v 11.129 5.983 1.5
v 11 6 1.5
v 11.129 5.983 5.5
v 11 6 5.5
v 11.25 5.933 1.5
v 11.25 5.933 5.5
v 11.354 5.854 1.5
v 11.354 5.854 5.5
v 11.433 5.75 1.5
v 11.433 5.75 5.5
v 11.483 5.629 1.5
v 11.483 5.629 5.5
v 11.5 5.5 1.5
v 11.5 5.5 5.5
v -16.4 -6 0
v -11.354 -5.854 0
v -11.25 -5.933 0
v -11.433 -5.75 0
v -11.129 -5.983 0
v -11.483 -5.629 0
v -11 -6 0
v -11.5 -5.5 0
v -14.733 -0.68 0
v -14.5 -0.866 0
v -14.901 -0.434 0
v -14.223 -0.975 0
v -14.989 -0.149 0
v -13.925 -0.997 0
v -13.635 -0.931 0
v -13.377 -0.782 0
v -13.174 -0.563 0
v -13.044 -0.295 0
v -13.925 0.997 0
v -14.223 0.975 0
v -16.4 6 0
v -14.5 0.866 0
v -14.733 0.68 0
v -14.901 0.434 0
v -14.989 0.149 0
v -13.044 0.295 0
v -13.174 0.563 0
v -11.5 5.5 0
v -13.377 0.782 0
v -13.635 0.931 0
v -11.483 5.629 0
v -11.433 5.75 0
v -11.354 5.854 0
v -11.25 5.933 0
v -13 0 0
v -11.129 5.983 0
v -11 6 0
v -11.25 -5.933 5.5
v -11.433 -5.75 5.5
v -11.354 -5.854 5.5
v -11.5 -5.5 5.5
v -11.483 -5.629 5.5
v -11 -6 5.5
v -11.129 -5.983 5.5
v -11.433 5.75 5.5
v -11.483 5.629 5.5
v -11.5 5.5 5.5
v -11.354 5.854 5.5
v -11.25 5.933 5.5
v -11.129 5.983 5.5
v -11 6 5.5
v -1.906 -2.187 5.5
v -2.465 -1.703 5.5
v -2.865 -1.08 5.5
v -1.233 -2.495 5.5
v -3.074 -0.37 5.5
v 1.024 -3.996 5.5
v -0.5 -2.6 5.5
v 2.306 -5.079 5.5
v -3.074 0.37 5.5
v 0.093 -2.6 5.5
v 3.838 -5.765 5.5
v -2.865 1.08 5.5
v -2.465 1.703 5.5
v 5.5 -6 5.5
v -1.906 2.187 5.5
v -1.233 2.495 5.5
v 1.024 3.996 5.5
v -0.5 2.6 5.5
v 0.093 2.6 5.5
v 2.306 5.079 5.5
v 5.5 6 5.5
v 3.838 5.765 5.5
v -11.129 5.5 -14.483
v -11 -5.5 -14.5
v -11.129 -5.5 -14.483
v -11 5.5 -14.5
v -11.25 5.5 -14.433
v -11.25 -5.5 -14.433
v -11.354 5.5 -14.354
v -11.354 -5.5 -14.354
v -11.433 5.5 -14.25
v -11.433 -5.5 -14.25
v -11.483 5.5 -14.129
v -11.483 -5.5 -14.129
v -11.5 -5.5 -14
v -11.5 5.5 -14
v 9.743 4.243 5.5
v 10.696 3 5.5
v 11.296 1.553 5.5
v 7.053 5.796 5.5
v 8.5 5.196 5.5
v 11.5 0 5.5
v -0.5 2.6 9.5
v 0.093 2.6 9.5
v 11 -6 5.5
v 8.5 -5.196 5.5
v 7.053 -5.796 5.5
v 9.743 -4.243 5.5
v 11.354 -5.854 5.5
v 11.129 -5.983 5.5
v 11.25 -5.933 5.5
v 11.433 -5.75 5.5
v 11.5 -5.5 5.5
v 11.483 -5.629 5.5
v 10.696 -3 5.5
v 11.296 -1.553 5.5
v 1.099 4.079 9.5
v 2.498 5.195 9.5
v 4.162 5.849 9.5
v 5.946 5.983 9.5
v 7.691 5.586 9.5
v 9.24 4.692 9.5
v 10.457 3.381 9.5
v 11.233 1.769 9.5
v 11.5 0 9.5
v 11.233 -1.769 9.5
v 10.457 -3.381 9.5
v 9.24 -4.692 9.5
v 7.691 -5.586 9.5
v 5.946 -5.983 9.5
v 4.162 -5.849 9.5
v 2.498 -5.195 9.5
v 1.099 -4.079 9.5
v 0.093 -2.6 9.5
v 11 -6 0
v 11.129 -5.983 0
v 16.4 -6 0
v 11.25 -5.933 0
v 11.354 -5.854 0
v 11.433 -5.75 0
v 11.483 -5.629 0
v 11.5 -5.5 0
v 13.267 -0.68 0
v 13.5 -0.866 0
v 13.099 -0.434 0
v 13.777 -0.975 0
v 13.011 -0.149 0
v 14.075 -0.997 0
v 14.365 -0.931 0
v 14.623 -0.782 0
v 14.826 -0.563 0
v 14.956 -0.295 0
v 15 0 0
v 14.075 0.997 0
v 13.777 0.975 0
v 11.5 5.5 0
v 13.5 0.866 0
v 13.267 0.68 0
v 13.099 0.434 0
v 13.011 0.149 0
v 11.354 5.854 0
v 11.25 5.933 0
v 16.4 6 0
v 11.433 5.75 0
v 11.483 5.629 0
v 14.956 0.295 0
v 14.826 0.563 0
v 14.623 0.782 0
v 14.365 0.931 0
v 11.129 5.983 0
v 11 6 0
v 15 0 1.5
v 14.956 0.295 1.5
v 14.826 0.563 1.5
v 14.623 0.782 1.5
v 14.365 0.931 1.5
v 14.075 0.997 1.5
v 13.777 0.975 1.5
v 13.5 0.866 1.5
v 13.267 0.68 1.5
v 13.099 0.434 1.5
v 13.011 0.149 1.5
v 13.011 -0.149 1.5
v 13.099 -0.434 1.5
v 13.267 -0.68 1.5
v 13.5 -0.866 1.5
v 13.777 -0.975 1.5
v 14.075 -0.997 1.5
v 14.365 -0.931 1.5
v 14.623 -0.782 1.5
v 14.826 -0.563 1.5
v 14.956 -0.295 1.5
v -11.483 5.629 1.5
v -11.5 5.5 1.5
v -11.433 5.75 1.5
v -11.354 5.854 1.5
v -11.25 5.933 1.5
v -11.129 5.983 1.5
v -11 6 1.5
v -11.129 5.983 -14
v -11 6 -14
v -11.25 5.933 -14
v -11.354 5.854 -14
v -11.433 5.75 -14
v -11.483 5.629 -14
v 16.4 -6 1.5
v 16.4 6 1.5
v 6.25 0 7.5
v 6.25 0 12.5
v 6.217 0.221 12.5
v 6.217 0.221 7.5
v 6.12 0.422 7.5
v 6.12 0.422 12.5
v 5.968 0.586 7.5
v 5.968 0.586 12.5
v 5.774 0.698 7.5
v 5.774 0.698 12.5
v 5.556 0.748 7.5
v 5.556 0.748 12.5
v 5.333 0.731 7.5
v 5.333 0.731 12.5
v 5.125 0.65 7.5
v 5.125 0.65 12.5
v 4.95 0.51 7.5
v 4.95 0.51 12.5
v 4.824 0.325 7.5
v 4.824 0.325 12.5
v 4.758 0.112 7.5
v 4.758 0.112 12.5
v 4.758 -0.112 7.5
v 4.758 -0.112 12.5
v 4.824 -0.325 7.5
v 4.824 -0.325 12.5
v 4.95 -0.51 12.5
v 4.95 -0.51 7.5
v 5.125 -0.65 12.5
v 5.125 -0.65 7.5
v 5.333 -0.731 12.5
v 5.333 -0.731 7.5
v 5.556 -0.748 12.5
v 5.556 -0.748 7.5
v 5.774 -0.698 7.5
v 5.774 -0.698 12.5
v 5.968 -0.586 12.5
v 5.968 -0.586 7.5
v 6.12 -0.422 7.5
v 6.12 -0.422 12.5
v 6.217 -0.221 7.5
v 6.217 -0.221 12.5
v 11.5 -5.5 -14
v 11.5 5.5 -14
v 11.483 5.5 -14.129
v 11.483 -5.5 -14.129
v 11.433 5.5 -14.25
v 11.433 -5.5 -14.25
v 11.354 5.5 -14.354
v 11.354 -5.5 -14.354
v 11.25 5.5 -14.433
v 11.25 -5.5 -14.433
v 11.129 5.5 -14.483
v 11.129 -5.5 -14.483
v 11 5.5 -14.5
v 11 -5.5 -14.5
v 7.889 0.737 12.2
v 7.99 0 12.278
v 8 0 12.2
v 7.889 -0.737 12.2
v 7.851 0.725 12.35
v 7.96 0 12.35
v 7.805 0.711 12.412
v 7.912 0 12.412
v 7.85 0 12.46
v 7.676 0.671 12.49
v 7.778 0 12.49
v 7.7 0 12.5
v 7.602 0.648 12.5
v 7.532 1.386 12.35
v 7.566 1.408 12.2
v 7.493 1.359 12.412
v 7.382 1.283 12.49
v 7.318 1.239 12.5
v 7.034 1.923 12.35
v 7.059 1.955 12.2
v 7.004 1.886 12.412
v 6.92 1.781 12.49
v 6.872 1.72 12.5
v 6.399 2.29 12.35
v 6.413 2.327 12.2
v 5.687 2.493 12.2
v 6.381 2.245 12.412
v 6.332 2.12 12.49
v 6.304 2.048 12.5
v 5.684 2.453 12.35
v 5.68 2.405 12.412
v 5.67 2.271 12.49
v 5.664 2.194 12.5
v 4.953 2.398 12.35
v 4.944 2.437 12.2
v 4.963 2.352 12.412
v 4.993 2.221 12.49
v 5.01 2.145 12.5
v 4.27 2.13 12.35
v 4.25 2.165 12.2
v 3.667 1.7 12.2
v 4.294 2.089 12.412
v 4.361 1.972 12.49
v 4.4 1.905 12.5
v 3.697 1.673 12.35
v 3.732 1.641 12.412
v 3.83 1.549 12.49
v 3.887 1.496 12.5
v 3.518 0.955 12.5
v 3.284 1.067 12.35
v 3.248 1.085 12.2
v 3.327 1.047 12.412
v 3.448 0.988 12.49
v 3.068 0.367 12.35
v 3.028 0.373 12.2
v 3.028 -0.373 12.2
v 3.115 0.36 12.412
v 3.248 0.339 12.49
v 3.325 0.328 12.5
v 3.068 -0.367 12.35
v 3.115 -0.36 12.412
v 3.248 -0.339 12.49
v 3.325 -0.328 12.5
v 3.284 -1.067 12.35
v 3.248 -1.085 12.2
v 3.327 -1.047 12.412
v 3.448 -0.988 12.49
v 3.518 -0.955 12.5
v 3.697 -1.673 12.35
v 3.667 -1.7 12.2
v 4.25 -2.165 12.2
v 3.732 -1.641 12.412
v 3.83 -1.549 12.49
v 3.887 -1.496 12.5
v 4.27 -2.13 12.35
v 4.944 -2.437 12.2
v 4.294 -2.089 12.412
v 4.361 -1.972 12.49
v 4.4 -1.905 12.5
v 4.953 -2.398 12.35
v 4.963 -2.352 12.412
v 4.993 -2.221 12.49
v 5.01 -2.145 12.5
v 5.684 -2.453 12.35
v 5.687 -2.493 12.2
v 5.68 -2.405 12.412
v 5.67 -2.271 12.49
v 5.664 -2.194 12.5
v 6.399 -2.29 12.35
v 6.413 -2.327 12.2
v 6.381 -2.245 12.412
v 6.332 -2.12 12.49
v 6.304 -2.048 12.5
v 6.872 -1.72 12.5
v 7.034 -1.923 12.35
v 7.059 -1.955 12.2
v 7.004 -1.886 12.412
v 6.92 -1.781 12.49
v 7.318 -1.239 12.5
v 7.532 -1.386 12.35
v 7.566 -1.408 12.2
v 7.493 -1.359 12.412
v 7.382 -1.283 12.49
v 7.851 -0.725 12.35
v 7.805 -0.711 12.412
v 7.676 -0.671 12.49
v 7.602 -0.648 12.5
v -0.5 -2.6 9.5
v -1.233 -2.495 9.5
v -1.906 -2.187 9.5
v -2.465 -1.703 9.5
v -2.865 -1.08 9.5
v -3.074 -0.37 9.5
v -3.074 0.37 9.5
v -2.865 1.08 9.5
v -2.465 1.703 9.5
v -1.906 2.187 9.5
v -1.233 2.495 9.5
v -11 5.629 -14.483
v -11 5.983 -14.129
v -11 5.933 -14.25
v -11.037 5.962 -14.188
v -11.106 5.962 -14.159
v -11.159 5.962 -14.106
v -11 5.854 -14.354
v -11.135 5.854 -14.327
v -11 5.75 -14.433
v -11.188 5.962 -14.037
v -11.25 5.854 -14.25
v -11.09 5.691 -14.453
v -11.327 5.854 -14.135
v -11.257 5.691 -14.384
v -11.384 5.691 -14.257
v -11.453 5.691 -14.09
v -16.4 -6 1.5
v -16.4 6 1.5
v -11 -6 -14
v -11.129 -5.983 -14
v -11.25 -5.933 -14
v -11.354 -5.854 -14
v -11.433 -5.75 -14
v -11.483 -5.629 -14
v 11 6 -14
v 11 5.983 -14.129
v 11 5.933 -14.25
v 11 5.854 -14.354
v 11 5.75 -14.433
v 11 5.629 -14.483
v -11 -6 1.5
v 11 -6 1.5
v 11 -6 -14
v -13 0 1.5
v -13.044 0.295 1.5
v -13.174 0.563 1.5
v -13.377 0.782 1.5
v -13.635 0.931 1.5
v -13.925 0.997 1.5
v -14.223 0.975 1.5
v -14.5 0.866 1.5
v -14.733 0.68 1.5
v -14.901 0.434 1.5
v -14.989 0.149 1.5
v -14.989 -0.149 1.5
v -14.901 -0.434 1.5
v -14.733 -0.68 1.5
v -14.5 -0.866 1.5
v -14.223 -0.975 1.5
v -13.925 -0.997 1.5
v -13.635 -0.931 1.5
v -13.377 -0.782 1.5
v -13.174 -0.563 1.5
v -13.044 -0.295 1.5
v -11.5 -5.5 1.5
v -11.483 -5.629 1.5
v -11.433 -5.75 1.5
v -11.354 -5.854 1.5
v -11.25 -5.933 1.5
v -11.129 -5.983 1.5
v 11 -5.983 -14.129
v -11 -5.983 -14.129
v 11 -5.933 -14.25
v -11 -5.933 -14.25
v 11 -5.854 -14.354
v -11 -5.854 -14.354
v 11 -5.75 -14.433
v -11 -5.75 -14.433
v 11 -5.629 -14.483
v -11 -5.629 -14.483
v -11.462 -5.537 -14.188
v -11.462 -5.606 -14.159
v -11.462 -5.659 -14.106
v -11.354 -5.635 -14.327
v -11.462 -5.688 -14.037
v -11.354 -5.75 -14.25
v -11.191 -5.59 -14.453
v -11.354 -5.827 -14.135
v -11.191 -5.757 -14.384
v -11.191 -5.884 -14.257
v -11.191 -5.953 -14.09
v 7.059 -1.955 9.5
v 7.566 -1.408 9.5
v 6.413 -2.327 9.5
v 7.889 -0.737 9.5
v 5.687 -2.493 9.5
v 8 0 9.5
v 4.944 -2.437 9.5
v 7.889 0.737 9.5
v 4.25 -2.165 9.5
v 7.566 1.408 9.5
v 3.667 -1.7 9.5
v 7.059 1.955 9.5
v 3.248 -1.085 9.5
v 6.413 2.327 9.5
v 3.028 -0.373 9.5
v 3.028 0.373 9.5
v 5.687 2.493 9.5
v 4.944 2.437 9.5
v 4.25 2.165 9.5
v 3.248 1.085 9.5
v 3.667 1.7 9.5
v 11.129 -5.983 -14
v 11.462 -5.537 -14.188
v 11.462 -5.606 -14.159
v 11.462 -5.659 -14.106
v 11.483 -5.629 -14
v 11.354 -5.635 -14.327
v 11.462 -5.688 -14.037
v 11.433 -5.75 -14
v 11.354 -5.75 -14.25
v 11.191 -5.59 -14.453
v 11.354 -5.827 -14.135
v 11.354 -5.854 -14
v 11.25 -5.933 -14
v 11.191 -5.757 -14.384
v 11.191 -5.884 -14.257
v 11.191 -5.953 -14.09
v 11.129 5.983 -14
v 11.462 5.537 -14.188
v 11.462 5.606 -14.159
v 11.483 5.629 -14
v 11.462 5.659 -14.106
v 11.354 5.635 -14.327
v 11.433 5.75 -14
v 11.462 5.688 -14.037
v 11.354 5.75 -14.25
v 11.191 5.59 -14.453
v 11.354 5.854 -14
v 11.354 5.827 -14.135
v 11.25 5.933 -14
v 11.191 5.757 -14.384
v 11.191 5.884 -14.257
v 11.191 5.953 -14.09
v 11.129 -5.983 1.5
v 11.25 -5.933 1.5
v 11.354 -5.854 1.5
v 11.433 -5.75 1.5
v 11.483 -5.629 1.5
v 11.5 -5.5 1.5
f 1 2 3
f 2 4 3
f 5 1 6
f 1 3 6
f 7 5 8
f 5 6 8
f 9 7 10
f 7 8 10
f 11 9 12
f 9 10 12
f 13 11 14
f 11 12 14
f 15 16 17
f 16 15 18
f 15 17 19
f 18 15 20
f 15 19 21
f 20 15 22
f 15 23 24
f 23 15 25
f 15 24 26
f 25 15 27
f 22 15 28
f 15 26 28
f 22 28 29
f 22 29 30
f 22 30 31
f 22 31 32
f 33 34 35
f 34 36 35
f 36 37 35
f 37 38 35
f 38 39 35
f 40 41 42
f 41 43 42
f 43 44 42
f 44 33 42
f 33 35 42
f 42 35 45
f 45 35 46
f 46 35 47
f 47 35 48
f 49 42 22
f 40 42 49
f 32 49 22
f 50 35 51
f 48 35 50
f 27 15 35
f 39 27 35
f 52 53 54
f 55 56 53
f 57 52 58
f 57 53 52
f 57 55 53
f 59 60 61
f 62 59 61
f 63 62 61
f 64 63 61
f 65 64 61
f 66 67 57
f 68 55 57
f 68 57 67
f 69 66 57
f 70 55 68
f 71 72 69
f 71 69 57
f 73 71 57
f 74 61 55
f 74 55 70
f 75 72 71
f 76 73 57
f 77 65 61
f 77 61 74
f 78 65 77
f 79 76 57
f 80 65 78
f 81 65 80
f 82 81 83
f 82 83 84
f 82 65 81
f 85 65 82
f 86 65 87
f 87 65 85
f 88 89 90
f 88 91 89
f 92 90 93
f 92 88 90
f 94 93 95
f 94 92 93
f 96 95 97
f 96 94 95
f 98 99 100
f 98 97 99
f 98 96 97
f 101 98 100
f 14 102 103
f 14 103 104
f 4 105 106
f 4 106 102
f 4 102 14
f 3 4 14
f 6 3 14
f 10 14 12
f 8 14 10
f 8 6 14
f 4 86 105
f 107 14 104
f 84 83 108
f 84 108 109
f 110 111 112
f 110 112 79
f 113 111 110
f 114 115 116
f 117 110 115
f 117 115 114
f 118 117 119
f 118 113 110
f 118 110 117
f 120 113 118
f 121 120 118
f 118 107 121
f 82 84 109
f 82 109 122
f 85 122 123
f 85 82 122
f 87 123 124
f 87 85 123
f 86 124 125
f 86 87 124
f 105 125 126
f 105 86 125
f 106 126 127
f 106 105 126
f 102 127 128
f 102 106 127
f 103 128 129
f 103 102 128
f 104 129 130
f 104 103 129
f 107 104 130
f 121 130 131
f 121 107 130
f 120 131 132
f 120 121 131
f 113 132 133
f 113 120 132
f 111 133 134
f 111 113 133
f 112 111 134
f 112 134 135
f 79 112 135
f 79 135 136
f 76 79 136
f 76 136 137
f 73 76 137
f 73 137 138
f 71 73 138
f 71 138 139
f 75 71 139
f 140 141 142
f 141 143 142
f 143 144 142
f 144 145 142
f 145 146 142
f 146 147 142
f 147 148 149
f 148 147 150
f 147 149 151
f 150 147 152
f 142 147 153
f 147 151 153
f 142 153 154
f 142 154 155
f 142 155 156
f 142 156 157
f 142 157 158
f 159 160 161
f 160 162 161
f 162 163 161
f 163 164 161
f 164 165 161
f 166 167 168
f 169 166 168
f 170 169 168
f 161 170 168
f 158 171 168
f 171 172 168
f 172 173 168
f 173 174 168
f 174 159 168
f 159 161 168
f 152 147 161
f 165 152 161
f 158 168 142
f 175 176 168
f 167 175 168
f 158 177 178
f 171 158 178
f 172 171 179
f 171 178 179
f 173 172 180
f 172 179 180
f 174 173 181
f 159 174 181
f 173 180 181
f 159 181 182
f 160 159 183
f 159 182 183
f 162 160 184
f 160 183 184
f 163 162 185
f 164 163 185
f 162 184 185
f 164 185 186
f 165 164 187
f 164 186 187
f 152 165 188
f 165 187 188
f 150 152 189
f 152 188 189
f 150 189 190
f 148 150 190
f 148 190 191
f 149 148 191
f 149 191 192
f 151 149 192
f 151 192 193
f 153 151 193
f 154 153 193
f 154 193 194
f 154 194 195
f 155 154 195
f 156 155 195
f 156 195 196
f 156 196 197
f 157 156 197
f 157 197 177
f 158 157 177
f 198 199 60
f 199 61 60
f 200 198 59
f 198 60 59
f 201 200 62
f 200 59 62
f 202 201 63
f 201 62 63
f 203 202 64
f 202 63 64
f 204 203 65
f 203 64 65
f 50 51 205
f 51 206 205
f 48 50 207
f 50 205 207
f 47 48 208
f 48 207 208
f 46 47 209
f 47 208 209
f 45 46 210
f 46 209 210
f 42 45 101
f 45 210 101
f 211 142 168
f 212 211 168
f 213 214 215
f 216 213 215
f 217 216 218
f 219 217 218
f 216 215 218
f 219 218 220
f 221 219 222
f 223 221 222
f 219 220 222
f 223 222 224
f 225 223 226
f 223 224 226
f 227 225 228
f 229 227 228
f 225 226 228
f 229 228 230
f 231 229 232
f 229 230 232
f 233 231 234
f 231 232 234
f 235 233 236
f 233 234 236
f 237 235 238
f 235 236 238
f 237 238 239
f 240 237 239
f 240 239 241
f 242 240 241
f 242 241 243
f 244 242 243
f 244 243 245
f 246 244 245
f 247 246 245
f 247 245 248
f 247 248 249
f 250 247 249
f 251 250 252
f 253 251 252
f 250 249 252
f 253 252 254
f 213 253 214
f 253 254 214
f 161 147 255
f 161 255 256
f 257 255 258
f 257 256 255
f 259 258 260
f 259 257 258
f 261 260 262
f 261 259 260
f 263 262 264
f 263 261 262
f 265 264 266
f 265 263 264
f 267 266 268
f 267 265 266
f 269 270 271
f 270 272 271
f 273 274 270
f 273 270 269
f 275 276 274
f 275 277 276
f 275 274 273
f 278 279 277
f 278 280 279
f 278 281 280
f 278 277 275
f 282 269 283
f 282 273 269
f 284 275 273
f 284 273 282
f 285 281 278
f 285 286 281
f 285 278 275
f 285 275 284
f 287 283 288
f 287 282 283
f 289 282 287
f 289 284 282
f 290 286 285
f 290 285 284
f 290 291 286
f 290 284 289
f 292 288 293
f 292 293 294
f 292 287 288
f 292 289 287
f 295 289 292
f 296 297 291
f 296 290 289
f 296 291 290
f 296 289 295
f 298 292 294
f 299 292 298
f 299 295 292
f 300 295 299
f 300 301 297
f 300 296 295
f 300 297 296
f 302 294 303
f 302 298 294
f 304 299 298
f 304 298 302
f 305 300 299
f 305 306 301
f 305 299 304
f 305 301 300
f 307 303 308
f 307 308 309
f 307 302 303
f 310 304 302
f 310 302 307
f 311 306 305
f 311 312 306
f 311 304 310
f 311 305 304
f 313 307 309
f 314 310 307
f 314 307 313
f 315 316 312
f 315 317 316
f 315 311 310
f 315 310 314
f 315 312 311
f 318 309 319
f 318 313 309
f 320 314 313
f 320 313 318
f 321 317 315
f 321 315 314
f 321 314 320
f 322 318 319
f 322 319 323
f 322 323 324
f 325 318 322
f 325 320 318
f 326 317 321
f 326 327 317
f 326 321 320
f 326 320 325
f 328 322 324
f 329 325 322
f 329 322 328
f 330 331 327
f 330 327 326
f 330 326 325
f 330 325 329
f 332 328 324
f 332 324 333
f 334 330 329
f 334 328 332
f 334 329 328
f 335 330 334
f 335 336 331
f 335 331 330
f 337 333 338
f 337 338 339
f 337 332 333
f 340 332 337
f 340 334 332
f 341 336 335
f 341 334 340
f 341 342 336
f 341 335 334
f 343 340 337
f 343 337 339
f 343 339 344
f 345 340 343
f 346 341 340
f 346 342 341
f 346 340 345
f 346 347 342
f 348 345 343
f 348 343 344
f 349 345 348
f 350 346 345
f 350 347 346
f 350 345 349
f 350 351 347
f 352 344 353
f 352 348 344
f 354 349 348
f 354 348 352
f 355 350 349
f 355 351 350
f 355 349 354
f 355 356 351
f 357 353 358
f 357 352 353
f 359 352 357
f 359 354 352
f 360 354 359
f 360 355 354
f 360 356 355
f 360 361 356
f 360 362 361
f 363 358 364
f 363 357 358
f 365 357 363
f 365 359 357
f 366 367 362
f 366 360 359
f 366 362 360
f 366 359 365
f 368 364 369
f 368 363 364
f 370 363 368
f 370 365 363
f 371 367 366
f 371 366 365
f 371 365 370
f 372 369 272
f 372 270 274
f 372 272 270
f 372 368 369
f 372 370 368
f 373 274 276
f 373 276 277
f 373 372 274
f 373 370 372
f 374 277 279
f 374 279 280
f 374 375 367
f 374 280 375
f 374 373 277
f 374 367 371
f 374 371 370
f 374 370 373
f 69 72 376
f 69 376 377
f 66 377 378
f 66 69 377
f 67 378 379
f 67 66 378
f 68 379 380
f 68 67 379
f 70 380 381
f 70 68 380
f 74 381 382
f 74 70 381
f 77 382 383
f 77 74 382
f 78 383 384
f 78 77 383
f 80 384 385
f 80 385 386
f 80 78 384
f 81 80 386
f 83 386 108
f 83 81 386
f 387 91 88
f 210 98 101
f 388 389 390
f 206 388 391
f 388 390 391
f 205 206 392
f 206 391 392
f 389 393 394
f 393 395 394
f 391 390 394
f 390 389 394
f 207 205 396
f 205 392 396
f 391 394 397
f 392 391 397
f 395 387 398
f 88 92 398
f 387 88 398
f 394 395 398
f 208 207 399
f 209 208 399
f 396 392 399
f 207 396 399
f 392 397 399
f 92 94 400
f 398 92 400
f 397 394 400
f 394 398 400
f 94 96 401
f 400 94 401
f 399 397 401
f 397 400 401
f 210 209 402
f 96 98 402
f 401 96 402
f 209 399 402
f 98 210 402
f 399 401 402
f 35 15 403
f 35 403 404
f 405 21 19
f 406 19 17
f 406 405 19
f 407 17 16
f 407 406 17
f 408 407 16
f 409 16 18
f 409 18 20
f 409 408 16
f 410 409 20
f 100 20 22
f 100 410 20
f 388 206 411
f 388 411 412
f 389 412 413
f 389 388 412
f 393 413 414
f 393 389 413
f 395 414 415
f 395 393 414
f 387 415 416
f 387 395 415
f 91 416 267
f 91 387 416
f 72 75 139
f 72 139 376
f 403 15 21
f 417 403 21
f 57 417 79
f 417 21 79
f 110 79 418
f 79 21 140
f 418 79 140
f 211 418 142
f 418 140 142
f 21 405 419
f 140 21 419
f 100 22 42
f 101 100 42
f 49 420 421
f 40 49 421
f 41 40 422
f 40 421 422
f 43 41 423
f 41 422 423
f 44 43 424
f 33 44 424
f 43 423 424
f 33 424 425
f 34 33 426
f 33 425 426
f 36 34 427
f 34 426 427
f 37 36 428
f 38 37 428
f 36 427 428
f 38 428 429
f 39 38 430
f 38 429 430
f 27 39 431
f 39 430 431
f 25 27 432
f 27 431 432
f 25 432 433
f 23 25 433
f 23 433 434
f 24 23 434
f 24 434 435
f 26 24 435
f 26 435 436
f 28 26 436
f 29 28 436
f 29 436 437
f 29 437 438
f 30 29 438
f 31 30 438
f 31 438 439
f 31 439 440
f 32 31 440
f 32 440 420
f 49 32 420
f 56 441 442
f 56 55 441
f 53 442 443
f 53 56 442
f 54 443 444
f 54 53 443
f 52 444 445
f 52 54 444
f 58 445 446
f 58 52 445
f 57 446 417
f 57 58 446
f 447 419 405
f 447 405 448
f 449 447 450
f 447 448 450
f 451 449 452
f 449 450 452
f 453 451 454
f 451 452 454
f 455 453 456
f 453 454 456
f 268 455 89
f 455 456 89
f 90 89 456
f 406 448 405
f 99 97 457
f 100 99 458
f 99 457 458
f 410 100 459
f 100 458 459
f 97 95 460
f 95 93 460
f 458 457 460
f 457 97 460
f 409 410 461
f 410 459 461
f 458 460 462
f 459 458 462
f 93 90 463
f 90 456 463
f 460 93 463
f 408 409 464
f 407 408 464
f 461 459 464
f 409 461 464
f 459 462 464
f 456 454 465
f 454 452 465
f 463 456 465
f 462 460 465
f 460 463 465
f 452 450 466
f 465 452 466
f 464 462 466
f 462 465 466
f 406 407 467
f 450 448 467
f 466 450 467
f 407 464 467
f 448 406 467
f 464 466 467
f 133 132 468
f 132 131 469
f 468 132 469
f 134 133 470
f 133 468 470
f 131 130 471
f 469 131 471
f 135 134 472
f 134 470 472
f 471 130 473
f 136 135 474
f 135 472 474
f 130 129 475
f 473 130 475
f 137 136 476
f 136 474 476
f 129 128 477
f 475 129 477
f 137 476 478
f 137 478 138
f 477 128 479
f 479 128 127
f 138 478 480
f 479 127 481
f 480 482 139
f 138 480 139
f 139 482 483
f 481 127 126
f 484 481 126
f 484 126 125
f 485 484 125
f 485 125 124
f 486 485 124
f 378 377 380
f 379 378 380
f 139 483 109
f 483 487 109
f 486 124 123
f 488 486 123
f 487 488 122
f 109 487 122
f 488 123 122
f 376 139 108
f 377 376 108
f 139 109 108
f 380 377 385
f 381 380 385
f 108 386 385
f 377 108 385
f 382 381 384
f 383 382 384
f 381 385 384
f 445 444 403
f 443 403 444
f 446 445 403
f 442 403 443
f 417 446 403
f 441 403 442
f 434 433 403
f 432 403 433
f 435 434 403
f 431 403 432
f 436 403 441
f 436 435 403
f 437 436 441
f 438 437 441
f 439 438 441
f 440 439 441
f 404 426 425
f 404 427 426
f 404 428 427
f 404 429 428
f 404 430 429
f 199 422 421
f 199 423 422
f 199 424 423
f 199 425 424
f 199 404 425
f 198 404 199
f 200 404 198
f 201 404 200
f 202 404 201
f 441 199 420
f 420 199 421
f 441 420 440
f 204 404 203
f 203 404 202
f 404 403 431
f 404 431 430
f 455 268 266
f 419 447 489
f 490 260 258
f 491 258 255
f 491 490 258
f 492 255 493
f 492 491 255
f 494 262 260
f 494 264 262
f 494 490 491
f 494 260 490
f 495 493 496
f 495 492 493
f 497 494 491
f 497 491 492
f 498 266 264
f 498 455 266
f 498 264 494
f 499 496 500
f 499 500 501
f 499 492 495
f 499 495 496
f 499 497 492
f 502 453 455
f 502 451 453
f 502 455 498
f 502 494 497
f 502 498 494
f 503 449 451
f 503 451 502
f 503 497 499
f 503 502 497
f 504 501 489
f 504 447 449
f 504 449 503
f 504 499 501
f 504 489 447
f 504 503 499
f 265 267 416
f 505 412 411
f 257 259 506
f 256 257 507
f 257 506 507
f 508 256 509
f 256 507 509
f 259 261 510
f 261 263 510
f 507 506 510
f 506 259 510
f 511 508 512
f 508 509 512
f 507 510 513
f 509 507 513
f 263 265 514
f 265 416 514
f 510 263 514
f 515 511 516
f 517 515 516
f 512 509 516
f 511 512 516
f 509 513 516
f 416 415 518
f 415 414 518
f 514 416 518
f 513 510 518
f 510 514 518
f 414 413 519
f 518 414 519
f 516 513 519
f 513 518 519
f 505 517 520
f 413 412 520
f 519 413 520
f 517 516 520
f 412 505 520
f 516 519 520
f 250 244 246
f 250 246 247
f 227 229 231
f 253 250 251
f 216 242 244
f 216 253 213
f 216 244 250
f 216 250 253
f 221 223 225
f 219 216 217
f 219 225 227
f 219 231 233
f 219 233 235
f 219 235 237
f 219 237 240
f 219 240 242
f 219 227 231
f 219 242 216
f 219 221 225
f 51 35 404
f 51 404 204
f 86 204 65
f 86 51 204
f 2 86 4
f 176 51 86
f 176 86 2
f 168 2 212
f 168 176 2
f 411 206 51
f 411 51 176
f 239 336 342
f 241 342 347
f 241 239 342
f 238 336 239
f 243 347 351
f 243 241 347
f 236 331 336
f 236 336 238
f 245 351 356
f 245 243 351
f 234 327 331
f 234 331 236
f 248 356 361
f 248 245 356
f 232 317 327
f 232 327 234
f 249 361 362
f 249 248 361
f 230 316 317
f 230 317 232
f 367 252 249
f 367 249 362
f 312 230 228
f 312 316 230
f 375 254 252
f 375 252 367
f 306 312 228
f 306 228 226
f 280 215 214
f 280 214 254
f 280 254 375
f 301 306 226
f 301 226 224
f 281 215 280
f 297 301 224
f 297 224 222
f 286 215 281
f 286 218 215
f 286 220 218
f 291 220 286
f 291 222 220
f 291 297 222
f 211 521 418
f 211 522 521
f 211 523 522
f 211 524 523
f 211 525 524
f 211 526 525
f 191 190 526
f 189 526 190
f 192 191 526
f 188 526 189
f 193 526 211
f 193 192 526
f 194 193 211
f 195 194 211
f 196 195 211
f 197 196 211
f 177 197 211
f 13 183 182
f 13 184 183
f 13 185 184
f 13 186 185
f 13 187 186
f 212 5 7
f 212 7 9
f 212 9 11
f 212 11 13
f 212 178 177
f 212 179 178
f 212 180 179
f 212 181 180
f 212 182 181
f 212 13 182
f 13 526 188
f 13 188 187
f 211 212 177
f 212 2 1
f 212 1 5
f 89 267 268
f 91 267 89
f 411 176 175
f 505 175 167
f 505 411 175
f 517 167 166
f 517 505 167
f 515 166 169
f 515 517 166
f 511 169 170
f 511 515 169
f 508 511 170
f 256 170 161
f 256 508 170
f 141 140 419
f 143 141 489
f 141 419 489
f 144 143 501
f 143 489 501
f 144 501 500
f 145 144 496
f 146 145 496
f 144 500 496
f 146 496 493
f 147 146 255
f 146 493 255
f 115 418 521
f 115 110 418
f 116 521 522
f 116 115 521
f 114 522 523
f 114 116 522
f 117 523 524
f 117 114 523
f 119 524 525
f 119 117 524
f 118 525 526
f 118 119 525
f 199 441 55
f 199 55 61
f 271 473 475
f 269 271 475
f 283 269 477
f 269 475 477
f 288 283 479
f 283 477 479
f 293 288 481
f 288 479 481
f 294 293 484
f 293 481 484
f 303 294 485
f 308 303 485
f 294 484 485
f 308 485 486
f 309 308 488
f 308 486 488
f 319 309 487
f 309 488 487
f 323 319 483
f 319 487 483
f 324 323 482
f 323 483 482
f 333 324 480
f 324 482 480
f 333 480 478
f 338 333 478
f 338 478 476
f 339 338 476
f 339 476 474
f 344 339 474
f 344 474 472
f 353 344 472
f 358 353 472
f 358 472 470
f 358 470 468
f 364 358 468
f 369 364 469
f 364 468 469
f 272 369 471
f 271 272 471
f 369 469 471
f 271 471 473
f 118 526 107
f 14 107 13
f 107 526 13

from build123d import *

# Parameters (mm, degrees)
SKETCH_1_W          = 32.8
SKETCH_1_H          = 12
EXTRUDE_1_DEPTH     = 1.5
SKETCH_2_W          = 23
SKETCH_2_H          = 12
EXTRUDE_2_DEPTH     = 4
SKETCH_6_W          = 23
SKETCH_6_H          = 12
EXTRUDE_5_DEPTH     = 14.5
SKETCH_7_R          = 1
CUT_EXTRUDE_2_DEPTH = 2
EXTRUDE_6_DEPTH     = 4
SKETCH_8_R          = 2.5
EXTRUDE_7_DEPTH     = 3
FILLET_1_R          = 0.3
SKETCH_9_R          = 0.75
CUT_EXTRUDE_3_DEPTH = 5
FILLET_2_R          = 0.5


with BuildPart() as part:
    # 草图1 → 凸台-拉伸1 (new body)
    with BuildSketch(Plane.XY):
        Rectangle(SKETCH_1_W, SKETCH_1_H)
    extrude(amount=EXTRUDE_1_DEPTH)

    # 草图2 → 凸台-拉伸2 (add)
    with BuildSketch(Plane.XY.offset(1.5)):
        Rectangle(SKETCH_2_W, SKETCH_2_H)
    extrude(amount=EXTRUDE_2_DEPTH)

    # 草图6 → 凸台-拉伸5 (add)
    with BuildSketch(Plane(origin=(0, 0, 0), x_dir=(-1, 0, 0), z_dir=(0, 0, -1))):
        Rectangle(SKETCH_6_W, SKETCH_6_H)
    extrude(amount=EXTRUDE_5_DEPTH)

    # 草图7 → 切除-拉伸2 (cut)
    with BuildSketch(Plane.XY.offset(1.5)):
        with Locations((-14, 0)):
            Circle(SKETCH_7_R)
        with Locations((14, 0)):
            Circle(SKETCH_7_R)
    extrude(amount=-CUT_EXTRUDE_2_DEPTH, mode=Mode.SUBTRACT)

    # 草图3 → 凸台-拉伸6 (add)
    with BuildSketch(Plane.XY.offset(5.5)):
        with BuildLine():
            Line((-0.5, 2.6), (0.092597666, 2.6))
            ThreePointArc((0.092597666, 2.6), (11.5, 0), (0.092597666, -2.6))
            Line((0.092597666, -2.6), (-0.5, -2.6))
            ThreePointArc((-0.5, -2.6), (-3.1, 0), (-0.5, 2.6))
        make_face()
    extrude(amount=EXTRUDE_6_DEPTH)

    # 草图8 → 凸台-拉伸7 (add)
    with BuildSketch(Plane.XY.offset(9.5)):
        with Locations((5.5, 0)):
            Circle(SKETCH_8_R)
    extrude(amount=EXTRUDE_7_DEPTH)

    # 圆角1
    fillet_1_edges = [part.edges().sort_by_distance(p)[0] for p in [
        (3, 0, 12.5),
    ]]
    fillet(fillet_1_edges, radius=FILLET_1_R)

    # 草图9 → 切除-拉伸3 (cut)
    with BuildSketch(Plane.XY.offset(12.5)):
        with Locations((5.5, 0)):
            Circle(SKETCH_9_R)
    extrude(amount=-CUT_EXTRUDE_3_DEPTH, mode=Mode.SUBTRACT)

    # 圆角2
    fillet_2_edges = [part.edges().sort_by_distance(p)[0] for p in [
        (0, -6, -14.5),
        (-11.5, 0, -14.5),
        (0, 6, -14.5),
        (11.5, 0, -14.5),
        (11.5, -6, 3.5),
        (11.5, -6, -7.25),
        (11.5, 6, -7.25),
        (-11.5, -6, -7.25),
        (-11.5, 6, -7.25),
        (11.5, 6, 3.5),
        (-11.5, -6, 3.5),
        (-11.5, 6, 3.5),
    ]]
    fillet(fillet_2_edges, radius=FILLET_2_R)


solid = part.part
